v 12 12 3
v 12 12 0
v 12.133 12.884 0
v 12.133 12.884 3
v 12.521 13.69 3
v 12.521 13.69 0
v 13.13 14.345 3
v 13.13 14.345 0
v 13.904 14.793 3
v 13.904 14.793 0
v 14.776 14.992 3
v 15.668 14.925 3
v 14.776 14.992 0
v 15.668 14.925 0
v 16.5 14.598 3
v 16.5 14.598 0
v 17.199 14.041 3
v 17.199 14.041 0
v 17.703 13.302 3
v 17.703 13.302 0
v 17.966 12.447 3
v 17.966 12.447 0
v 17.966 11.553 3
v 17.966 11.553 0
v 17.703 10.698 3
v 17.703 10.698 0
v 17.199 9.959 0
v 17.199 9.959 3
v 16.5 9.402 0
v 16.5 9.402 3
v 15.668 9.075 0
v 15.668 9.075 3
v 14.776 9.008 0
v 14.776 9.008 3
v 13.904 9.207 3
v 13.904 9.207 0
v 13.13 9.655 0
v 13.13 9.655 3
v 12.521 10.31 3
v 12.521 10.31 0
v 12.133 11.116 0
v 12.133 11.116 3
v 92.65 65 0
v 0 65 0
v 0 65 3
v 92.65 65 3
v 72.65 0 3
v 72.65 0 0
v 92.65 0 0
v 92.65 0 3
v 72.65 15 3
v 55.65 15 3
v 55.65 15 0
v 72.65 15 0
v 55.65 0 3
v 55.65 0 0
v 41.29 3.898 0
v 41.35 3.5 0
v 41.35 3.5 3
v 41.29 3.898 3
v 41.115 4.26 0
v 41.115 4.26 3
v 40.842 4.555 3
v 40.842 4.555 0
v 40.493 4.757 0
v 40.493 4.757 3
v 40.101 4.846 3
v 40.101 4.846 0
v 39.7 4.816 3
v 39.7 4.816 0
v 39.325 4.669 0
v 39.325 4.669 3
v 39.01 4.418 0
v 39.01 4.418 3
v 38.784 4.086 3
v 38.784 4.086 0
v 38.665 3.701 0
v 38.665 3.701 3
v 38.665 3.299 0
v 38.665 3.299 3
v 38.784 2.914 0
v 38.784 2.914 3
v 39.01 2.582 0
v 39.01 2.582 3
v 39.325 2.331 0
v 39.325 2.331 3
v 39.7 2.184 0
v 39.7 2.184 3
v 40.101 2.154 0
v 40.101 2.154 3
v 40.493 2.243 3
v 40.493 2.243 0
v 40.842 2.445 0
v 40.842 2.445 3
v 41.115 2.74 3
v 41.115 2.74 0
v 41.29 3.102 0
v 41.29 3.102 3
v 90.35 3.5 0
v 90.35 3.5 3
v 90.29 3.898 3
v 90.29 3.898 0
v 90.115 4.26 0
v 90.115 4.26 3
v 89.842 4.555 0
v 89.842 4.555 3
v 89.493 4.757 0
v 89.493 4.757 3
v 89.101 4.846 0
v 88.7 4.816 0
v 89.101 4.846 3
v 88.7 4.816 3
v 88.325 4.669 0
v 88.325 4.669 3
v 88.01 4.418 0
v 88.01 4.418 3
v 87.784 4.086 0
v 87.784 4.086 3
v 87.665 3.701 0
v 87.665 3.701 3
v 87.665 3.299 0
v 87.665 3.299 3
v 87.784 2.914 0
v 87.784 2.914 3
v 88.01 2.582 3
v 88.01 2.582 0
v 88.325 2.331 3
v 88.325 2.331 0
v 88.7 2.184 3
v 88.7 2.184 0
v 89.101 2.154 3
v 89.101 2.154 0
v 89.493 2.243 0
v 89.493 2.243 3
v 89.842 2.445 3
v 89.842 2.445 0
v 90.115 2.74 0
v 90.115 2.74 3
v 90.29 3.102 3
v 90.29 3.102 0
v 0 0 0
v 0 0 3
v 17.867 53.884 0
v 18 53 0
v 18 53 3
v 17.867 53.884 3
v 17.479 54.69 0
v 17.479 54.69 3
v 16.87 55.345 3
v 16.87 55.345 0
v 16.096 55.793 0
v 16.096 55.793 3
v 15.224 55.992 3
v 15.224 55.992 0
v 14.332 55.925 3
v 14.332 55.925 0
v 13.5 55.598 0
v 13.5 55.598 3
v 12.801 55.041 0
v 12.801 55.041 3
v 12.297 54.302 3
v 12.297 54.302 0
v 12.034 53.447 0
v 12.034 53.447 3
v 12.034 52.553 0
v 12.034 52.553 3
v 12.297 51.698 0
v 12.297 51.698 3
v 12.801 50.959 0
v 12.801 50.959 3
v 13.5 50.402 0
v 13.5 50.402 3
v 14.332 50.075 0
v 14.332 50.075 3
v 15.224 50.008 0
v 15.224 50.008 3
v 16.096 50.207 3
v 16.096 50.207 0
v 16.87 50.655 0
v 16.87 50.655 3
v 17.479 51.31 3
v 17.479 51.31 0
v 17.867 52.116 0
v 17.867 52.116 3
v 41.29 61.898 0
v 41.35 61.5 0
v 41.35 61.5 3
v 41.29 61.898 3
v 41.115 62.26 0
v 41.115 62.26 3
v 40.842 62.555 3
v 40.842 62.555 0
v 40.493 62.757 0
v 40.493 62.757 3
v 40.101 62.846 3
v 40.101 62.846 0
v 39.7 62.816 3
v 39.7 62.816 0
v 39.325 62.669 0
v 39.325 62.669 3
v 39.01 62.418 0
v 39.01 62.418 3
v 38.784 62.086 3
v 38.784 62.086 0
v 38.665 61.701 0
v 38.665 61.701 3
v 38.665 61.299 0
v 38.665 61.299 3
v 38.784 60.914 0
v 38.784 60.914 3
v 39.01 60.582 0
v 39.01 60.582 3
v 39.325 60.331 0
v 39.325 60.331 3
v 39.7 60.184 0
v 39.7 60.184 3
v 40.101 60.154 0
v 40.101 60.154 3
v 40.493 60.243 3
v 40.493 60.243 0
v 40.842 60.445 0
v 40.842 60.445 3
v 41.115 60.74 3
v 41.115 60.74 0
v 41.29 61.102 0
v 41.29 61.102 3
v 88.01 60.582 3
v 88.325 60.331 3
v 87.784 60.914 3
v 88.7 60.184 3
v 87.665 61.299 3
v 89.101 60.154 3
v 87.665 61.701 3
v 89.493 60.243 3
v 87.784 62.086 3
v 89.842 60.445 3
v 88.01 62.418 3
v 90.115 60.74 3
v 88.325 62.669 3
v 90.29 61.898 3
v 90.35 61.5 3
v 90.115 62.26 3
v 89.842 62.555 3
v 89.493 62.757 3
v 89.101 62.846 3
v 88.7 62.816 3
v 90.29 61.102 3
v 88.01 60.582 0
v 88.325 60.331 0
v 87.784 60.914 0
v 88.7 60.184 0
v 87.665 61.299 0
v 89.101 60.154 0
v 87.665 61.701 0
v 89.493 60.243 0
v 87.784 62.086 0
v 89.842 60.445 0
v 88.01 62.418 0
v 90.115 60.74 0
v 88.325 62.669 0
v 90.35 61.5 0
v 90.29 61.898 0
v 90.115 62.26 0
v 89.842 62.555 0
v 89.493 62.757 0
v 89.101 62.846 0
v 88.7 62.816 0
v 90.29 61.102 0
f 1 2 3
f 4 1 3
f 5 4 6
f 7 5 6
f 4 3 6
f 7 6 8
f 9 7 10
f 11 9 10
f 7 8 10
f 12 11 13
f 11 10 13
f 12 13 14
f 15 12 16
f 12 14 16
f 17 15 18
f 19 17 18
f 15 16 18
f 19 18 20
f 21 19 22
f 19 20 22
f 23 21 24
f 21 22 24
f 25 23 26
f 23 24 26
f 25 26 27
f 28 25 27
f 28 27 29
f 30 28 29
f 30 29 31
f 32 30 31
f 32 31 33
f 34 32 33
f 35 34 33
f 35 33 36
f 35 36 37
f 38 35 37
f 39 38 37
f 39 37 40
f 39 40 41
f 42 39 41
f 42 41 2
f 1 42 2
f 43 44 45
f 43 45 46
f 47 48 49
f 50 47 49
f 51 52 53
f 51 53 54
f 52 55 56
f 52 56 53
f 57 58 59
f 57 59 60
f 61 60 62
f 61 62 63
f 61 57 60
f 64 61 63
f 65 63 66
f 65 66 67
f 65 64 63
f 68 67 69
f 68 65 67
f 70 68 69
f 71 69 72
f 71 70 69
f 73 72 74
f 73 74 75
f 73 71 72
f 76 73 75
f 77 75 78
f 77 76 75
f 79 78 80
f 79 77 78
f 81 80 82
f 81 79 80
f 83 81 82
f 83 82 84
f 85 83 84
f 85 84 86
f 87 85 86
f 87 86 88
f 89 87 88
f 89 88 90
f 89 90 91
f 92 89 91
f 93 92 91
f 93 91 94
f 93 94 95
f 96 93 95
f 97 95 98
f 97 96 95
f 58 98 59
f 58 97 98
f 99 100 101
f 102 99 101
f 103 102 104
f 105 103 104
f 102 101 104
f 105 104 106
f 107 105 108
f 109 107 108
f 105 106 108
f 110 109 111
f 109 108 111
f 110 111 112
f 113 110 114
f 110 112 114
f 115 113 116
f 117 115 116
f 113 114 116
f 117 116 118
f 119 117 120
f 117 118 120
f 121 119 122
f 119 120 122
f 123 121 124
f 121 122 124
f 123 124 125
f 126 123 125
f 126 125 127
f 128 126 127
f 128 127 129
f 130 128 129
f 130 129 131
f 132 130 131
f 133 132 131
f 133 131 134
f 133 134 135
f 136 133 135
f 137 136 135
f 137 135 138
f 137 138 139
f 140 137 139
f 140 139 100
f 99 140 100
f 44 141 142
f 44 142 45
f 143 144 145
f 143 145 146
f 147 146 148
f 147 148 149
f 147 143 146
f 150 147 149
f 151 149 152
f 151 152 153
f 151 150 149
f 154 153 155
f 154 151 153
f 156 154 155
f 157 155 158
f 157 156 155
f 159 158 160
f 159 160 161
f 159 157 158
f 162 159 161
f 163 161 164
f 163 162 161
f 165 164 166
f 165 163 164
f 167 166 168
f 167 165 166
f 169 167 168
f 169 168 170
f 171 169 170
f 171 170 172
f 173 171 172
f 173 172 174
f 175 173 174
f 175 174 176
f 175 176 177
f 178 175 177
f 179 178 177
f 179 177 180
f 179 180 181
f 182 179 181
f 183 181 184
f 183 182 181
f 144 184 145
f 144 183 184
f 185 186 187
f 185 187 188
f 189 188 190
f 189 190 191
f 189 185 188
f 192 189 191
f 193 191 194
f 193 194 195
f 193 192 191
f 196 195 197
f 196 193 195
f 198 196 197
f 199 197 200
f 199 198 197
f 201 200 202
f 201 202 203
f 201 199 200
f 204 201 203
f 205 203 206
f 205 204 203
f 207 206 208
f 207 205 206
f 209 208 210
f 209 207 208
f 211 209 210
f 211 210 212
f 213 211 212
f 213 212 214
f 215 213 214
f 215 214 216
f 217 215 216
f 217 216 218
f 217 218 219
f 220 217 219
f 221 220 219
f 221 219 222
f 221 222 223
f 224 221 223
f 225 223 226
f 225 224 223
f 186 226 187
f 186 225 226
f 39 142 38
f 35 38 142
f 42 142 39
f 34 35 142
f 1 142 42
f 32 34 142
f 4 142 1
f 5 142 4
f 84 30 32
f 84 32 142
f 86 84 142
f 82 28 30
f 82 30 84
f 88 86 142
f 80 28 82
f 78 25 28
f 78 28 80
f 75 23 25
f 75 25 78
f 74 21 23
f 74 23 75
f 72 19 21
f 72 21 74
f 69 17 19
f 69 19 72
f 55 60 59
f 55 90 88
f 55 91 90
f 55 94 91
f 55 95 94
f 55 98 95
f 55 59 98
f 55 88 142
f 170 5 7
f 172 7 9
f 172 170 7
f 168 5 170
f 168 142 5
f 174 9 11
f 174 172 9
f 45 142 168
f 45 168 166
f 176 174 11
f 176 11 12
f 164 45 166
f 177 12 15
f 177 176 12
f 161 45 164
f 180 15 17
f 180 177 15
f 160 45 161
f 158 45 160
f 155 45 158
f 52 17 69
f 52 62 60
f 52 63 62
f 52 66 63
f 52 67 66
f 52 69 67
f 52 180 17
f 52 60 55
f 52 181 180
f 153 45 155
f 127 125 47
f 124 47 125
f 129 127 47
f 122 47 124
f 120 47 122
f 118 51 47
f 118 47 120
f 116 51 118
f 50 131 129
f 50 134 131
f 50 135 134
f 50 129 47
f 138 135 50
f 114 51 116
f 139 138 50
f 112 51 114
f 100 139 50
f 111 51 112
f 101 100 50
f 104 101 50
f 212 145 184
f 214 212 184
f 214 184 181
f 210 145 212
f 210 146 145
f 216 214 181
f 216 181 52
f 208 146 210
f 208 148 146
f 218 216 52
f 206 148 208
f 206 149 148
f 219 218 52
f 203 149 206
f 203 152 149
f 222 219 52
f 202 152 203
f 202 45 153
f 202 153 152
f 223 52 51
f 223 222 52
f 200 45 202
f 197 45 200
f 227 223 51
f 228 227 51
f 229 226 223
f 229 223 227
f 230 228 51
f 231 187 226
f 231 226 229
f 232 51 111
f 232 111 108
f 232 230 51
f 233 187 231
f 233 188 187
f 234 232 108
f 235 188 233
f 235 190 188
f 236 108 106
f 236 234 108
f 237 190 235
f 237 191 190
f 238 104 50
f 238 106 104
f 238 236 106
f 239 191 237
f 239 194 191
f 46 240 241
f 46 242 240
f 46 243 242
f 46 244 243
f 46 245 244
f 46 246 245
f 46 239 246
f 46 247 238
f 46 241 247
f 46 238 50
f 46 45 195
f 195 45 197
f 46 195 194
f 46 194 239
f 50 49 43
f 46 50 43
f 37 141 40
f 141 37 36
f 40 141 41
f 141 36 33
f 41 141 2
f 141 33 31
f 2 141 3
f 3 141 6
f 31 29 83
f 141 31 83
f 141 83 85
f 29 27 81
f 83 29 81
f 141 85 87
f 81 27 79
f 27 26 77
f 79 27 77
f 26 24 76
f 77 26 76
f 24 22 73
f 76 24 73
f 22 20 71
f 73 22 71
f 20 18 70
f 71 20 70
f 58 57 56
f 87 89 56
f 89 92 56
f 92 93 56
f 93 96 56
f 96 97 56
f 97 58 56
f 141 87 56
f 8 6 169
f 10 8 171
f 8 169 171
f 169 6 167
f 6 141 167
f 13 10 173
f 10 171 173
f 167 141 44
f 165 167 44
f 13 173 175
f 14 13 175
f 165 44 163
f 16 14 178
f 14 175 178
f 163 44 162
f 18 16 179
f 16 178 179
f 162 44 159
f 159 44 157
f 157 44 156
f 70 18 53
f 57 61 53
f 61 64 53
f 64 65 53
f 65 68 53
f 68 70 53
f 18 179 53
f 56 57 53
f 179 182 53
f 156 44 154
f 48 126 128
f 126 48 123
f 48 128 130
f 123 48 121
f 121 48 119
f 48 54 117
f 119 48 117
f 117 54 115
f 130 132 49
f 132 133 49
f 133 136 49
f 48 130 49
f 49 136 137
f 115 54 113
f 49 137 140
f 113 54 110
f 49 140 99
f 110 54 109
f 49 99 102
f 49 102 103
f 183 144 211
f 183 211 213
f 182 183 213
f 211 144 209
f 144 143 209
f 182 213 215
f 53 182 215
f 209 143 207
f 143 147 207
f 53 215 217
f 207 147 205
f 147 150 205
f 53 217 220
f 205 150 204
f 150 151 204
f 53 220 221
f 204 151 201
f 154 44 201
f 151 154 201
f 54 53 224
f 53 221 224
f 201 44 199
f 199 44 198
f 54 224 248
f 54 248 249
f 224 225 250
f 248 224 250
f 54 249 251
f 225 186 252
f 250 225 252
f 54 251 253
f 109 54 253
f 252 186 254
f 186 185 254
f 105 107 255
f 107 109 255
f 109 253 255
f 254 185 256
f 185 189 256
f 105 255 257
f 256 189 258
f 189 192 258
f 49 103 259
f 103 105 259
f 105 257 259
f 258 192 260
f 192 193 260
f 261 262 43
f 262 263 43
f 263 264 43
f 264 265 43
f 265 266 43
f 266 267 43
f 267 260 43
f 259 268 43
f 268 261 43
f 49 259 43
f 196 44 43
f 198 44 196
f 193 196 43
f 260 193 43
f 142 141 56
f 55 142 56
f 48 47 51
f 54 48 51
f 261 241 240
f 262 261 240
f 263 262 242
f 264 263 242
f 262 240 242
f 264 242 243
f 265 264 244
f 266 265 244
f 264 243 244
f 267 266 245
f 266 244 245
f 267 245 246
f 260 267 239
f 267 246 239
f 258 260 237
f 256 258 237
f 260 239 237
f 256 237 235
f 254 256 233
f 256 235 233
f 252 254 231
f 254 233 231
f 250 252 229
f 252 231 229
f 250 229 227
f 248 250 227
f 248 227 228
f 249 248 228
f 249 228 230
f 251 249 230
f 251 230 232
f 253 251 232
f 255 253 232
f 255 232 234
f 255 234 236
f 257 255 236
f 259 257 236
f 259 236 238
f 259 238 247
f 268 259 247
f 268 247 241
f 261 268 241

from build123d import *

# Parameters (mm, degrees)
SKETCH1_W           = 92.65
SKETCH1_H           = 65
SKETCH1_R           = 3
SKETCH1_R_2         = 1.35
BOSS_EXTRUDE1_DEPTH = 3
SKETCH2_R           = 1.35
CUT_EXTRUDE1_DEPTH  = 4
SKETCH3_W           = 17
SKETCH3_H           = 15
CUT_EXTRUDE2_DEPTH  = 4
SKETCH4_R           = 3
CUT_EXTRUDE3_DEPTH  = 4


with BuildPart() as part:
    # Sketch1 → Boss-Extrude1 (new body)
    with BuildSketch(Plane.XY):
        with Locations((46.325, 32.5)):
            Rectangle(SKETCH1_W, SKETCH1_H)
        with Locations((15, 53)):
            Circle(SKETCH1_R, mode=Mode.SUBTRACT)
        with Locations((40, 61.5)):
            Circle(SKETCH1_R_2, mode=Mode.SUBTRACT)
        with Locations((40, 3.5)):
            Circle(SKETCH1_R_2, mode=Mode.SUBTRACT)
    extrude(amount=BOSS_EXTRUDE1_DEPTH)

    # Sketch2 → Cut-Extrude1 (cut, through all)
    with BuildSketch(Plane.XY.offset(3)):
        with Locations((89, 61.5)):
            Circle(SKETCH2_R)
        with Locations((89, 3.5)):
            Circle(SKETCH2_R)
    extrude(amount=-CUT_EXTRUDE1_DEPTH, mode=Mode.SUBTRACT)

    # Sketch3 → Cut-Extrude2 (cut, through all)
    with BuildSketch(Plane.XY.offset(3)):
        with Locations((64.15, 7.5)):
            Rectangle(SKETCH3_W, SKETCH3_H)
    extrude(amount=-CUT_EXTRUDE2_DEPTH, mode=Mode.SUBTRACT)

    # Sketch4 → Cut-Extrude3 (cut, through all)
    with BuildSketch(Plane(origin=(0, 0, 0), x_dir=(-1, 0, 0), z_dir=(0, 0, -1))):
        with Locations((-15, 12)):
            Circle(SKETCH4_R)
    extrude(amount=-CUT_EXTRUDE3_DEPTH, mode=Mode.SUBTRACT)


solid = part.part
